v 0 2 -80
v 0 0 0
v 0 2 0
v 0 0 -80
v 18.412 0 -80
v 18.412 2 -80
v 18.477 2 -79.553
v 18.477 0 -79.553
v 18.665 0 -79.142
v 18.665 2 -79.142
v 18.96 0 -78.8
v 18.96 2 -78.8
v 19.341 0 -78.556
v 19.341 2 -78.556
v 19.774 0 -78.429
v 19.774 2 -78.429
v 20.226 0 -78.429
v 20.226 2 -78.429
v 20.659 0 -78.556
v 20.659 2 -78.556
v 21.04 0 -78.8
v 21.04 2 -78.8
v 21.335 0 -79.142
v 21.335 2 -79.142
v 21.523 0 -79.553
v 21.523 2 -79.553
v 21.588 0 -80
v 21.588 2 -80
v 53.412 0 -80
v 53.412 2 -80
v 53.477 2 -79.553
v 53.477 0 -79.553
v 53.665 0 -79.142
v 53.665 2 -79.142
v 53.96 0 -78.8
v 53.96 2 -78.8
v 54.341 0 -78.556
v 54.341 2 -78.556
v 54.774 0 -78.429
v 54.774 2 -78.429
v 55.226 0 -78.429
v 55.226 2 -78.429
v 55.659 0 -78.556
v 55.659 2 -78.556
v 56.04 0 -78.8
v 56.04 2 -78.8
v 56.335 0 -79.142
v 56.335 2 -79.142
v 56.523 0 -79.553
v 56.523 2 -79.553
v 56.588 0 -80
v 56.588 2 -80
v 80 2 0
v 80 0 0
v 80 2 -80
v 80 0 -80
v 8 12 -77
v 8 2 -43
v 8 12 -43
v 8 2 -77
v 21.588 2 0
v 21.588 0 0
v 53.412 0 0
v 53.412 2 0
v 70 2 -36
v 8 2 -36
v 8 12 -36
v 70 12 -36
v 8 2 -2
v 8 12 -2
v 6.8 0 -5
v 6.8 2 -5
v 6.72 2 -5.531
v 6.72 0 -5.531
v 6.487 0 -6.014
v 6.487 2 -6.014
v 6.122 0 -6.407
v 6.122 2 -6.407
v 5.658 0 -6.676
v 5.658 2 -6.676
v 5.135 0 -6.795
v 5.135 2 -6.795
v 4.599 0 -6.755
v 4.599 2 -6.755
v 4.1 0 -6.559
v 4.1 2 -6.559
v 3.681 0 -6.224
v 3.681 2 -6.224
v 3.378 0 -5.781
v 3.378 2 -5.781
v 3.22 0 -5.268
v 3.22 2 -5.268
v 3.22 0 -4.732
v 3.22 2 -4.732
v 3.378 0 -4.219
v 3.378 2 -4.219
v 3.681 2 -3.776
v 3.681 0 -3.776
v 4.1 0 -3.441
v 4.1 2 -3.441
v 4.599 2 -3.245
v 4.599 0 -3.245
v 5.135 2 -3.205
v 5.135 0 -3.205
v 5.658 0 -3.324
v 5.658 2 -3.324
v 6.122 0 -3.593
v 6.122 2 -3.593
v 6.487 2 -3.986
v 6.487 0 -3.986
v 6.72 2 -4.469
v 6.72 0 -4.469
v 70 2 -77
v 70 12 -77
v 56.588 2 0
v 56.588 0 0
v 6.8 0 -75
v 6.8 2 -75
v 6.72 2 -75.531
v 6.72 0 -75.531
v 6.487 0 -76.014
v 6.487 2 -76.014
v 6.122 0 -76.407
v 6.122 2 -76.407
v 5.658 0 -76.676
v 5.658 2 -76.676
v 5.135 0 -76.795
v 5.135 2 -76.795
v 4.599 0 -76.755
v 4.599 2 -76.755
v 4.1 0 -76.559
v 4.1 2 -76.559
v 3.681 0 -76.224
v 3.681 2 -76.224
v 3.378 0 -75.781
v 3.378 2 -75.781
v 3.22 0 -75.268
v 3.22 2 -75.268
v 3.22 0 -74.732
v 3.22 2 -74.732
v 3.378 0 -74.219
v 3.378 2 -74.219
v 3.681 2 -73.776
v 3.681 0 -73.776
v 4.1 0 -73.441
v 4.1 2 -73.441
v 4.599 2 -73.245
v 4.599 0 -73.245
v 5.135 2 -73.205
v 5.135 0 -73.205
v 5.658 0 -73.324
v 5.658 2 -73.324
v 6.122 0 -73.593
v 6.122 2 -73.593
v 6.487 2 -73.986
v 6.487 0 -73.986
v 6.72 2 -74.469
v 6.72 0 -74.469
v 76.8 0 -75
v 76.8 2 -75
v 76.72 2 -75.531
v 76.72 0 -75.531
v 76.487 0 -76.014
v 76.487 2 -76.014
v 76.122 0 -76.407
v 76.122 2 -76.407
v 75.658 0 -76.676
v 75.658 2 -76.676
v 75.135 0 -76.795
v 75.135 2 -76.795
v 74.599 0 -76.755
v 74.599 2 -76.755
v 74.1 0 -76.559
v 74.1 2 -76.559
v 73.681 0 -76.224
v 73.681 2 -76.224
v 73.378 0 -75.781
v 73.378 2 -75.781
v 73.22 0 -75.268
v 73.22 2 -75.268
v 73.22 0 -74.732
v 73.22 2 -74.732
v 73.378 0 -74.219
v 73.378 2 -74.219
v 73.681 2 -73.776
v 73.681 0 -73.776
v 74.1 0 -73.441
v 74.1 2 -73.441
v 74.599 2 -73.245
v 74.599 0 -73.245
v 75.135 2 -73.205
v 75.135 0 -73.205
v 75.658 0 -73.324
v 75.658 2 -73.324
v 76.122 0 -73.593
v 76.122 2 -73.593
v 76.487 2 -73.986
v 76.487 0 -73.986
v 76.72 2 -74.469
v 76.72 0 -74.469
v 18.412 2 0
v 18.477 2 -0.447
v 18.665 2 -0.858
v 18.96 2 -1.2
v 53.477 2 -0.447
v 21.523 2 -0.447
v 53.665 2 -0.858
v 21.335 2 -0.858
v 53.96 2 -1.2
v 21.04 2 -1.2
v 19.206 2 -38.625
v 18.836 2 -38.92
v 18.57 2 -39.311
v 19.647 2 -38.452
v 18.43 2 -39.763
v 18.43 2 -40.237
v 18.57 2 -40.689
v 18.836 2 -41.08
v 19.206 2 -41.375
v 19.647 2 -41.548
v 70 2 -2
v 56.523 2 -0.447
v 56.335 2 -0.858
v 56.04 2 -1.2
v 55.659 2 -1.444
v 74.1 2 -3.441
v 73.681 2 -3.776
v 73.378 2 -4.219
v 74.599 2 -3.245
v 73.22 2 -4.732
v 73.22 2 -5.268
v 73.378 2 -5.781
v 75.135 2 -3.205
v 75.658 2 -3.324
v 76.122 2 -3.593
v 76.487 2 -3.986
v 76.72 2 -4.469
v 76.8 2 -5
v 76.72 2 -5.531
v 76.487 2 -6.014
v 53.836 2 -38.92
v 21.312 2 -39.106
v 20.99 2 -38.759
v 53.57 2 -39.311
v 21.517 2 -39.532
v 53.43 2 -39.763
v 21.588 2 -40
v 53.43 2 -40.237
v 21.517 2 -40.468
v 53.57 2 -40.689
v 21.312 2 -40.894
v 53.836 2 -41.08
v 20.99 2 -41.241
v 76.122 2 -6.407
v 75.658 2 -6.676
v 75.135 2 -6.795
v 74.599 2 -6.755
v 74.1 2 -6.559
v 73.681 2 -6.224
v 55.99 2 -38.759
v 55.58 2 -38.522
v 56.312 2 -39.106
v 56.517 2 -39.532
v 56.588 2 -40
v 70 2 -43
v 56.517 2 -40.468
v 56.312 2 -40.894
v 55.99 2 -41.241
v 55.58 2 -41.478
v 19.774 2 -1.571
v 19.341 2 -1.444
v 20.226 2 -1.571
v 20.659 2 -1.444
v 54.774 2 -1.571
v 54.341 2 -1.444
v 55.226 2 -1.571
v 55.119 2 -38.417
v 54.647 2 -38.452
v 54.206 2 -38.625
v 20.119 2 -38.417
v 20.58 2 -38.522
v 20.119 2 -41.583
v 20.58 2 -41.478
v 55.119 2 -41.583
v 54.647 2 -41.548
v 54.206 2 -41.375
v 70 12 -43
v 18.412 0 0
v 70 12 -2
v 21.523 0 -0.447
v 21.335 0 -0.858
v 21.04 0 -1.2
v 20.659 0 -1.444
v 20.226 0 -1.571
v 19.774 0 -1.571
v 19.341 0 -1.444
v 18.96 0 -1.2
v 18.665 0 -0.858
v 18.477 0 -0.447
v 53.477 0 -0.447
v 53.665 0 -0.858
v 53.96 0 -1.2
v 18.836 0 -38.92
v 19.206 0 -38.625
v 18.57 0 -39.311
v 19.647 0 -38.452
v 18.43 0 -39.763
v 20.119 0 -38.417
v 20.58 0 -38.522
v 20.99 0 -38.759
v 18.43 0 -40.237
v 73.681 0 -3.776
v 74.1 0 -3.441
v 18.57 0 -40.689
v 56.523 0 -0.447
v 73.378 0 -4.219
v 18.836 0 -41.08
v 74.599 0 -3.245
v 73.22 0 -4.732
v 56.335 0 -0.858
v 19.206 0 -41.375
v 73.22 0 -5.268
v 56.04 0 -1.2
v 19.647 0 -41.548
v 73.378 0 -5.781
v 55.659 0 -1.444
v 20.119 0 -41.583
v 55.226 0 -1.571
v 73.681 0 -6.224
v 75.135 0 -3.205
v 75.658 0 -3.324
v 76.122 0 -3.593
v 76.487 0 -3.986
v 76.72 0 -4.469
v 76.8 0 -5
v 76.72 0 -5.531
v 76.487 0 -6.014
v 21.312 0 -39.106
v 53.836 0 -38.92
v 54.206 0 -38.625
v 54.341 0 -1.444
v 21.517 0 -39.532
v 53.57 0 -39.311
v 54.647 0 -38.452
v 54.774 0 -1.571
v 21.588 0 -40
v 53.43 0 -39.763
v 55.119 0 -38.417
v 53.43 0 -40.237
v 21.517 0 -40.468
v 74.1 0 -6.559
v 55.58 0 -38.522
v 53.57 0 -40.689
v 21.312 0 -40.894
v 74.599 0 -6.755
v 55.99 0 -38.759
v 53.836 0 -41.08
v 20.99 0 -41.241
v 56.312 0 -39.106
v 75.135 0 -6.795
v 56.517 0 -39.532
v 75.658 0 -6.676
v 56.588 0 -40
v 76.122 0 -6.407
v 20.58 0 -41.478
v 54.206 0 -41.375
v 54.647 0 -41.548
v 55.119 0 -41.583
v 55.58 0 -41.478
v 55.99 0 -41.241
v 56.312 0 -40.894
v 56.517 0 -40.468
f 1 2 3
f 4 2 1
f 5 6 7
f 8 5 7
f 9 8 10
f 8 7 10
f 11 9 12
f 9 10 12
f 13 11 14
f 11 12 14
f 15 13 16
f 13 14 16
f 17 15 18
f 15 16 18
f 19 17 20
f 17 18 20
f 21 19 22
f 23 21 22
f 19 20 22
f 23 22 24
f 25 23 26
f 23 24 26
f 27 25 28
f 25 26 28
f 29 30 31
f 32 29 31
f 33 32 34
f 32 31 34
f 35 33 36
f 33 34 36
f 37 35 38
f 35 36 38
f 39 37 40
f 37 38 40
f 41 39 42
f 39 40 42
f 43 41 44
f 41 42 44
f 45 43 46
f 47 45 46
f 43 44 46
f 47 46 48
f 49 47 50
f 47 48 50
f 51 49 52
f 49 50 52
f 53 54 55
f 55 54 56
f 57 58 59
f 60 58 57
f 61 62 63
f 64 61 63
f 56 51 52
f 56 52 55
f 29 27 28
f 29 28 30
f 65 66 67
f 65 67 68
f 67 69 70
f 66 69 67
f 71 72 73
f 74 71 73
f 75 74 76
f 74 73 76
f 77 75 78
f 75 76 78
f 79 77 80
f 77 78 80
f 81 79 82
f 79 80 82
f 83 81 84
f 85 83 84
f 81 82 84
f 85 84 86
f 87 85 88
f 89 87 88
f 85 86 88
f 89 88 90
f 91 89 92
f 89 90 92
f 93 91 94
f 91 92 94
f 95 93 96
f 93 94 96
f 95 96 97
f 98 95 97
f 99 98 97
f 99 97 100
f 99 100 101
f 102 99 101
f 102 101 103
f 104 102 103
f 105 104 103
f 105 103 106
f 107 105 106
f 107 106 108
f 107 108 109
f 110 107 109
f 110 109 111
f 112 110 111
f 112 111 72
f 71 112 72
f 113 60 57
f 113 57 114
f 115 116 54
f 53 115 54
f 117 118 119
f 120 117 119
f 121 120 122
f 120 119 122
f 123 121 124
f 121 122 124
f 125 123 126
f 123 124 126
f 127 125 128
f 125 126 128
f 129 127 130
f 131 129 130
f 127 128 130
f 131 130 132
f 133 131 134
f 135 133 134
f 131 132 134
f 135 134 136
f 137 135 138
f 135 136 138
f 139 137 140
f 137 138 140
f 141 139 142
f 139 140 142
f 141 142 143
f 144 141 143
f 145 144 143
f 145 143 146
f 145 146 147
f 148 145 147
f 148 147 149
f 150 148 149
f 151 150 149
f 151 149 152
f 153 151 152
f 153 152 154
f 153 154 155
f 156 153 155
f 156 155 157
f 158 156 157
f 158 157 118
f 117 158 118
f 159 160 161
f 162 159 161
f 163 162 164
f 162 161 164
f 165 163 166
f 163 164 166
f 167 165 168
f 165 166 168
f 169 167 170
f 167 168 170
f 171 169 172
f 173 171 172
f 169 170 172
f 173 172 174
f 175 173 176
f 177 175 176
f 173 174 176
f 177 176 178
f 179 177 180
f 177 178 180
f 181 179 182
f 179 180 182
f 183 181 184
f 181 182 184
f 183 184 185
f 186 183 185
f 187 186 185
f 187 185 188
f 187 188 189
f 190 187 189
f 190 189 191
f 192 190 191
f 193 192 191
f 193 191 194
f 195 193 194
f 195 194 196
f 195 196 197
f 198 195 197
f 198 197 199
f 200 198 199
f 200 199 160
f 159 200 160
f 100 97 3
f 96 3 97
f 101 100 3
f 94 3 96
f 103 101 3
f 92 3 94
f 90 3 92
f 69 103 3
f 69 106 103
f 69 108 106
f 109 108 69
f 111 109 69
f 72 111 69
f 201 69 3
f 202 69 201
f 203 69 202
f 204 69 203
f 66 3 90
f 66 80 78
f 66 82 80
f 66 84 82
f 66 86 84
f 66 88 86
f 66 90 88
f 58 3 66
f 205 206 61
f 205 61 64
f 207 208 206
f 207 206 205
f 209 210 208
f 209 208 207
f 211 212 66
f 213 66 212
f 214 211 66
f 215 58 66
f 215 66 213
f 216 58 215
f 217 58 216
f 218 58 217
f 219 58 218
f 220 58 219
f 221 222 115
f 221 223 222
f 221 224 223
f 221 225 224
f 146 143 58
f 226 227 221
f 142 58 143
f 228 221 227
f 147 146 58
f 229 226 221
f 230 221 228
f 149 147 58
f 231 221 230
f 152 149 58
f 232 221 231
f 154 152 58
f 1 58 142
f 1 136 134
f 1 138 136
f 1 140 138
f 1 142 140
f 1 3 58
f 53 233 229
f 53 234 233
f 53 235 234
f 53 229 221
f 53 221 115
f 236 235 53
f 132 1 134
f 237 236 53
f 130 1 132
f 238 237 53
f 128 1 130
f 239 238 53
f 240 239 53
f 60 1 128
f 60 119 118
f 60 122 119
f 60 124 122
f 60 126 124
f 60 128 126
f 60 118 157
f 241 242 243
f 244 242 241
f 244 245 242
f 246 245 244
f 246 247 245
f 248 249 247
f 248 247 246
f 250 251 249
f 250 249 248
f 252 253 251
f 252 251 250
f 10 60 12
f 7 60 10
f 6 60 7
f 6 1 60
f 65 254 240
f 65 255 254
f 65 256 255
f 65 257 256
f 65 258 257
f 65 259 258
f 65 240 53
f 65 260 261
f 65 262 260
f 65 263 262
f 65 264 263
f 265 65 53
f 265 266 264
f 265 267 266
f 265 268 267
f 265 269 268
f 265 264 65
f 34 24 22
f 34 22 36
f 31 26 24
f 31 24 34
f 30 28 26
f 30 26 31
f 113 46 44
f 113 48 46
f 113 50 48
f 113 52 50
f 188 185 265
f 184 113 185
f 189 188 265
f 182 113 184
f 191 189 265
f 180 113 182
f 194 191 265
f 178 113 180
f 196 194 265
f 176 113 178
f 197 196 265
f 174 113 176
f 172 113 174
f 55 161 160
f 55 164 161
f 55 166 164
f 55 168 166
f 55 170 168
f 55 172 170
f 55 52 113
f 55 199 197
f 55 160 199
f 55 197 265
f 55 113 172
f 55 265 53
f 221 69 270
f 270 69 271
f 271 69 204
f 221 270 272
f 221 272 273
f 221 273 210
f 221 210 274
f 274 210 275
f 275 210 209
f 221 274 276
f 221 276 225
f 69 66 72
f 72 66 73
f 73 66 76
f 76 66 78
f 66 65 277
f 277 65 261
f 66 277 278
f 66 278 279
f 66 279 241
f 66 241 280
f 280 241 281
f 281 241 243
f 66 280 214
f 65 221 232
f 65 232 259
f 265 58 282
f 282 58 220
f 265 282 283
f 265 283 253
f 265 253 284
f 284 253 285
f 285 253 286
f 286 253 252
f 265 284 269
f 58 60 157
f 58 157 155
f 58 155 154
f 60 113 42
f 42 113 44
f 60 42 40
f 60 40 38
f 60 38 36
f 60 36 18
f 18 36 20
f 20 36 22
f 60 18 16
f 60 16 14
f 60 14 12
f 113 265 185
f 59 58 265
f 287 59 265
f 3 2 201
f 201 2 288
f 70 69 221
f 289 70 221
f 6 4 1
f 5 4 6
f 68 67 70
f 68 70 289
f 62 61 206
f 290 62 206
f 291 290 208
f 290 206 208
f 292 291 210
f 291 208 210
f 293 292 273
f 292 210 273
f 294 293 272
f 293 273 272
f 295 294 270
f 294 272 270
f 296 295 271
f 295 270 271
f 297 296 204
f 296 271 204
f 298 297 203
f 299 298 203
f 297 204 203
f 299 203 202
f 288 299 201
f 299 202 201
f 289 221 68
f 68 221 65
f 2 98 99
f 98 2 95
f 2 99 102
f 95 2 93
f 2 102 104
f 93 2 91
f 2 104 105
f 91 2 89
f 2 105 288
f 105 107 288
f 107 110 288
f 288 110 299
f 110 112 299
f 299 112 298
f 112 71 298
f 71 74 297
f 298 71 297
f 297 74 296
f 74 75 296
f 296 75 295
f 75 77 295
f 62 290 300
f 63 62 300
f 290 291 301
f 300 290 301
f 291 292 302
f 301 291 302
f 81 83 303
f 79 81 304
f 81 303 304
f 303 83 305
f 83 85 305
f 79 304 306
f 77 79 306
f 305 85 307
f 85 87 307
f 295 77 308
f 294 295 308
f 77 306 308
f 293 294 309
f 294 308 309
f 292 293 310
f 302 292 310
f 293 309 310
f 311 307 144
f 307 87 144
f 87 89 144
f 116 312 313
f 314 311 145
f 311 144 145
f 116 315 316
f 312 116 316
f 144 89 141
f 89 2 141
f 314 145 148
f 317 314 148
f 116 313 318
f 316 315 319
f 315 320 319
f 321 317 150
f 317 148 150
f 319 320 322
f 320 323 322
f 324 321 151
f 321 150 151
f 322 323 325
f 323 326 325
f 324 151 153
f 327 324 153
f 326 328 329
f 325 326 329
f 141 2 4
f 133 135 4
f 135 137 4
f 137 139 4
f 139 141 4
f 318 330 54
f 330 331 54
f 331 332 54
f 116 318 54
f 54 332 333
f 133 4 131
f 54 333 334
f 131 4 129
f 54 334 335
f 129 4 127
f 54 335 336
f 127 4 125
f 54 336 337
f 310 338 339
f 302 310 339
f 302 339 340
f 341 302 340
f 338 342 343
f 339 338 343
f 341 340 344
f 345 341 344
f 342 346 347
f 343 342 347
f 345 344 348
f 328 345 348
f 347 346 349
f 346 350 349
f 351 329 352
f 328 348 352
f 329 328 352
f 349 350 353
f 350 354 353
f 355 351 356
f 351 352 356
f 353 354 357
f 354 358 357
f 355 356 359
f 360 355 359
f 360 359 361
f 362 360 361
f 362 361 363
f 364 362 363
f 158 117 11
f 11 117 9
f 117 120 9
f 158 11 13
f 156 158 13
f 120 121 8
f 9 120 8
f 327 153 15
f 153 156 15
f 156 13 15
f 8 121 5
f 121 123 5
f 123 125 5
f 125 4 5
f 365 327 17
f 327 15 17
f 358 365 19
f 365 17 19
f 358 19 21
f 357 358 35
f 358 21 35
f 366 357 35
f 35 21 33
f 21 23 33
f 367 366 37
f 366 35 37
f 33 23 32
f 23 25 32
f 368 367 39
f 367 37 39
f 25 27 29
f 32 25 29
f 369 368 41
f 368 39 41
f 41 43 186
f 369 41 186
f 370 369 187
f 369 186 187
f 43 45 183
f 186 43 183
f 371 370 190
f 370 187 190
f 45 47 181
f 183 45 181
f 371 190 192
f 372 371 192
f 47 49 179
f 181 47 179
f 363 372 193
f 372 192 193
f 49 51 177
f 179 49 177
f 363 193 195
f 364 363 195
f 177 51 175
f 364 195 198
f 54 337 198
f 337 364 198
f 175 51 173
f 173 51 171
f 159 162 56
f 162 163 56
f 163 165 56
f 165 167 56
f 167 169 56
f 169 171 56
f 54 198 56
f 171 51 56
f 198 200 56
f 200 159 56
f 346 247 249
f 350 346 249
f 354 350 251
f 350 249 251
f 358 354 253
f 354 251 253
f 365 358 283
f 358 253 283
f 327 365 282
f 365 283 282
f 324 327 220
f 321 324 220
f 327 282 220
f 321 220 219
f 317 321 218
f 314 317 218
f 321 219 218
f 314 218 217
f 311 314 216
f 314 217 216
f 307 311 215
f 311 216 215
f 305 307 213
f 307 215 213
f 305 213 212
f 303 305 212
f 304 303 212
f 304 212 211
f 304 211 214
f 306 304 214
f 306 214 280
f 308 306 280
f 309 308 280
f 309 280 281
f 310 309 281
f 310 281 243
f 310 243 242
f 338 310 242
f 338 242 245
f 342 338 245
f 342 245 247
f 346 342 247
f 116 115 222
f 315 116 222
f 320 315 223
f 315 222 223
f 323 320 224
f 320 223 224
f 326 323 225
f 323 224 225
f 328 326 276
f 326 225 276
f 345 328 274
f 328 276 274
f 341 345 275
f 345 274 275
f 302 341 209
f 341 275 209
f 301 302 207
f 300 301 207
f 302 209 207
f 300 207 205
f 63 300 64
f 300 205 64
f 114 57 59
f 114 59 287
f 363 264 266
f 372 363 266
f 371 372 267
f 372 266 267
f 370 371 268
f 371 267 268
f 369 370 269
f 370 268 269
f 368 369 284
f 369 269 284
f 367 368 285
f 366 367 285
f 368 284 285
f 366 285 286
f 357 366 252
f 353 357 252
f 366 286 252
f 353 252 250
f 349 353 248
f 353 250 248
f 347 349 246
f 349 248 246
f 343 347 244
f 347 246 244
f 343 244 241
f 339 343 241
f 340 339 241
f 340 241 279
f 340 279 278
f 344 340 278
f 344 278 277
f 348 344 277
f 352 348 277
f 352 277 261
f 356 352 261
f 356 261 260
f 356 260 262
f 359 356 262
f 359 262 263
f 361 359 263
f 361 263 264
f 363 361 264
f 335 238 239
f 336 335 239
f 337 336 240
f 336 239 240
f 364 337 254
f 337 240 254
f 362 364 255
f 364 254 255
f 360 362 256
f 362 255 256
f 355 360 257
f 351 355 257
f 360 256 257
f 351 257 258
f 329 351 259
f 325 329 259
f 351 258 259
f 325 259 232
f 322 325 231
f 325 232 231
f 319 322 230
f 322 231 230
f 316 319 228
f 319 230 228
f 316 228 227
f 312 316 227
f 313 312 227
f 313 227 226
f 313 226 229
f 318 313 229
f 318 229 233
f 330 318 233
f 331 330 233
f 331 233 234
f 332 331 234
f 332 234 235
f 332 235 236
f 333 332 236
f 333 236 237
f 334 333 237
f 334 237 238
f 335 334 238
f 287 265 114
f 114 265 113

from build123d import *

# Parameters (mm, degrees)
SKETCH1_W                     = 80
SKETCH1_H                     = 80
PCB_DEPTH                     = 2
SKETCH3_W                     = 62
SKETCH3_H                     = 34
BATTERY_STACK_DEPTH           = 10
LPATTERN3_COUNT               = 2
LPATTERN3_PITCH               = 41
SKETCH4_R                     = 1.8
ATTACHMENT_HOLES_DEPTH        = 3
SKETCH6_R                     = 1.5875
BATTERY_CABLE_TIE_HOLES_DEPTH = 3
LPATTERN2_COUNT               = 2
LPATTERN2_PITCH               = 35
LPATTERN2_COUNT_DIR2          = 3
LPATTERN2_PITCH_DIR2          = 40


with BuildPart() as part:
    # Sketch1 → PCB (new body)
    with BuildSketch(Plane(origin=(0, 0, 0), x_dir=(1, 0, 0), z_dir=(0, 1, 0))):
        with Locations((40, 40)):
            Rectangle(SKETCH1_W, SKETCH1_H)
    extrude(amount=PCB_DEPTH)

    # Sketch3 → Battery Stack (add)
    with BuildSketch(Plane(origin=(0, 2, 0), x_dir=(1, 0, 0), z_dir=(0, 1, 0))):
        with Locations((39, 19)):
            Rectangle(SKETCH3_W, SKETCH3_H)
    battery_stack = extrude(amount=BATTERY_STACK_DEPTH)

    # LPattern3: Battery Stack ×2
    with Locations(*[(0, 0, -i * LPATTERN3_PITCH) for i in range(1, LPATTERN3_COUNT)]):
        add(battery_stack)

    # Sketch4 → Attachment holes (cut, through all)
    with BuildSketch(Plane(origin=(0, 2, 0), x_dir=(1, 0, 0), z_dir=(0, 1, 0))):
        with Locations((5, 75)):
            Circle(SKETCH4_R)
        with Locations((75, 75)):
            Circle(SKETCH4_R)
        with Locations((75, 5)):
            Circle(SKETCH4_R)
        with Locations((5, 5)):
            Circle(SKETCH4_R)
    extrude(amount=-ATTACHMENT_HOLES_DEPTH, mode=Mode.SUBTRACT)

    # Sketch6 → Battery Cable Tie Holes (cut, through all)
    with BuildSketch(Plane(origin=(0, 2, 0), x_dir=(1, 0, 0), z_dir=(0, 1, 0))):
        with Locations((20, 0)):
            Circle(SKETCH6_R)
    battery_cable_tie_holes = extrude(amount=-BATTERY_CABLE_TIE_HOLES_DEPTH, mode=Mode.SUBTRACT)

    # LPattern2: Battery Cable Tie Holes 2 × 3
    with Locations(*[(i * LPATTERN2_PITCH, 0, -j * LPATTERN2_PITCH_DIR2) for i in range(LPATTERN2_COUNT) for j in range(LPATTERN2_COUNT_DIR2) if (i, j) != (0, 0)]):
        add(battery_cable_tie_holes, mode=Mode.SUBTRACT)


solid = part.part
